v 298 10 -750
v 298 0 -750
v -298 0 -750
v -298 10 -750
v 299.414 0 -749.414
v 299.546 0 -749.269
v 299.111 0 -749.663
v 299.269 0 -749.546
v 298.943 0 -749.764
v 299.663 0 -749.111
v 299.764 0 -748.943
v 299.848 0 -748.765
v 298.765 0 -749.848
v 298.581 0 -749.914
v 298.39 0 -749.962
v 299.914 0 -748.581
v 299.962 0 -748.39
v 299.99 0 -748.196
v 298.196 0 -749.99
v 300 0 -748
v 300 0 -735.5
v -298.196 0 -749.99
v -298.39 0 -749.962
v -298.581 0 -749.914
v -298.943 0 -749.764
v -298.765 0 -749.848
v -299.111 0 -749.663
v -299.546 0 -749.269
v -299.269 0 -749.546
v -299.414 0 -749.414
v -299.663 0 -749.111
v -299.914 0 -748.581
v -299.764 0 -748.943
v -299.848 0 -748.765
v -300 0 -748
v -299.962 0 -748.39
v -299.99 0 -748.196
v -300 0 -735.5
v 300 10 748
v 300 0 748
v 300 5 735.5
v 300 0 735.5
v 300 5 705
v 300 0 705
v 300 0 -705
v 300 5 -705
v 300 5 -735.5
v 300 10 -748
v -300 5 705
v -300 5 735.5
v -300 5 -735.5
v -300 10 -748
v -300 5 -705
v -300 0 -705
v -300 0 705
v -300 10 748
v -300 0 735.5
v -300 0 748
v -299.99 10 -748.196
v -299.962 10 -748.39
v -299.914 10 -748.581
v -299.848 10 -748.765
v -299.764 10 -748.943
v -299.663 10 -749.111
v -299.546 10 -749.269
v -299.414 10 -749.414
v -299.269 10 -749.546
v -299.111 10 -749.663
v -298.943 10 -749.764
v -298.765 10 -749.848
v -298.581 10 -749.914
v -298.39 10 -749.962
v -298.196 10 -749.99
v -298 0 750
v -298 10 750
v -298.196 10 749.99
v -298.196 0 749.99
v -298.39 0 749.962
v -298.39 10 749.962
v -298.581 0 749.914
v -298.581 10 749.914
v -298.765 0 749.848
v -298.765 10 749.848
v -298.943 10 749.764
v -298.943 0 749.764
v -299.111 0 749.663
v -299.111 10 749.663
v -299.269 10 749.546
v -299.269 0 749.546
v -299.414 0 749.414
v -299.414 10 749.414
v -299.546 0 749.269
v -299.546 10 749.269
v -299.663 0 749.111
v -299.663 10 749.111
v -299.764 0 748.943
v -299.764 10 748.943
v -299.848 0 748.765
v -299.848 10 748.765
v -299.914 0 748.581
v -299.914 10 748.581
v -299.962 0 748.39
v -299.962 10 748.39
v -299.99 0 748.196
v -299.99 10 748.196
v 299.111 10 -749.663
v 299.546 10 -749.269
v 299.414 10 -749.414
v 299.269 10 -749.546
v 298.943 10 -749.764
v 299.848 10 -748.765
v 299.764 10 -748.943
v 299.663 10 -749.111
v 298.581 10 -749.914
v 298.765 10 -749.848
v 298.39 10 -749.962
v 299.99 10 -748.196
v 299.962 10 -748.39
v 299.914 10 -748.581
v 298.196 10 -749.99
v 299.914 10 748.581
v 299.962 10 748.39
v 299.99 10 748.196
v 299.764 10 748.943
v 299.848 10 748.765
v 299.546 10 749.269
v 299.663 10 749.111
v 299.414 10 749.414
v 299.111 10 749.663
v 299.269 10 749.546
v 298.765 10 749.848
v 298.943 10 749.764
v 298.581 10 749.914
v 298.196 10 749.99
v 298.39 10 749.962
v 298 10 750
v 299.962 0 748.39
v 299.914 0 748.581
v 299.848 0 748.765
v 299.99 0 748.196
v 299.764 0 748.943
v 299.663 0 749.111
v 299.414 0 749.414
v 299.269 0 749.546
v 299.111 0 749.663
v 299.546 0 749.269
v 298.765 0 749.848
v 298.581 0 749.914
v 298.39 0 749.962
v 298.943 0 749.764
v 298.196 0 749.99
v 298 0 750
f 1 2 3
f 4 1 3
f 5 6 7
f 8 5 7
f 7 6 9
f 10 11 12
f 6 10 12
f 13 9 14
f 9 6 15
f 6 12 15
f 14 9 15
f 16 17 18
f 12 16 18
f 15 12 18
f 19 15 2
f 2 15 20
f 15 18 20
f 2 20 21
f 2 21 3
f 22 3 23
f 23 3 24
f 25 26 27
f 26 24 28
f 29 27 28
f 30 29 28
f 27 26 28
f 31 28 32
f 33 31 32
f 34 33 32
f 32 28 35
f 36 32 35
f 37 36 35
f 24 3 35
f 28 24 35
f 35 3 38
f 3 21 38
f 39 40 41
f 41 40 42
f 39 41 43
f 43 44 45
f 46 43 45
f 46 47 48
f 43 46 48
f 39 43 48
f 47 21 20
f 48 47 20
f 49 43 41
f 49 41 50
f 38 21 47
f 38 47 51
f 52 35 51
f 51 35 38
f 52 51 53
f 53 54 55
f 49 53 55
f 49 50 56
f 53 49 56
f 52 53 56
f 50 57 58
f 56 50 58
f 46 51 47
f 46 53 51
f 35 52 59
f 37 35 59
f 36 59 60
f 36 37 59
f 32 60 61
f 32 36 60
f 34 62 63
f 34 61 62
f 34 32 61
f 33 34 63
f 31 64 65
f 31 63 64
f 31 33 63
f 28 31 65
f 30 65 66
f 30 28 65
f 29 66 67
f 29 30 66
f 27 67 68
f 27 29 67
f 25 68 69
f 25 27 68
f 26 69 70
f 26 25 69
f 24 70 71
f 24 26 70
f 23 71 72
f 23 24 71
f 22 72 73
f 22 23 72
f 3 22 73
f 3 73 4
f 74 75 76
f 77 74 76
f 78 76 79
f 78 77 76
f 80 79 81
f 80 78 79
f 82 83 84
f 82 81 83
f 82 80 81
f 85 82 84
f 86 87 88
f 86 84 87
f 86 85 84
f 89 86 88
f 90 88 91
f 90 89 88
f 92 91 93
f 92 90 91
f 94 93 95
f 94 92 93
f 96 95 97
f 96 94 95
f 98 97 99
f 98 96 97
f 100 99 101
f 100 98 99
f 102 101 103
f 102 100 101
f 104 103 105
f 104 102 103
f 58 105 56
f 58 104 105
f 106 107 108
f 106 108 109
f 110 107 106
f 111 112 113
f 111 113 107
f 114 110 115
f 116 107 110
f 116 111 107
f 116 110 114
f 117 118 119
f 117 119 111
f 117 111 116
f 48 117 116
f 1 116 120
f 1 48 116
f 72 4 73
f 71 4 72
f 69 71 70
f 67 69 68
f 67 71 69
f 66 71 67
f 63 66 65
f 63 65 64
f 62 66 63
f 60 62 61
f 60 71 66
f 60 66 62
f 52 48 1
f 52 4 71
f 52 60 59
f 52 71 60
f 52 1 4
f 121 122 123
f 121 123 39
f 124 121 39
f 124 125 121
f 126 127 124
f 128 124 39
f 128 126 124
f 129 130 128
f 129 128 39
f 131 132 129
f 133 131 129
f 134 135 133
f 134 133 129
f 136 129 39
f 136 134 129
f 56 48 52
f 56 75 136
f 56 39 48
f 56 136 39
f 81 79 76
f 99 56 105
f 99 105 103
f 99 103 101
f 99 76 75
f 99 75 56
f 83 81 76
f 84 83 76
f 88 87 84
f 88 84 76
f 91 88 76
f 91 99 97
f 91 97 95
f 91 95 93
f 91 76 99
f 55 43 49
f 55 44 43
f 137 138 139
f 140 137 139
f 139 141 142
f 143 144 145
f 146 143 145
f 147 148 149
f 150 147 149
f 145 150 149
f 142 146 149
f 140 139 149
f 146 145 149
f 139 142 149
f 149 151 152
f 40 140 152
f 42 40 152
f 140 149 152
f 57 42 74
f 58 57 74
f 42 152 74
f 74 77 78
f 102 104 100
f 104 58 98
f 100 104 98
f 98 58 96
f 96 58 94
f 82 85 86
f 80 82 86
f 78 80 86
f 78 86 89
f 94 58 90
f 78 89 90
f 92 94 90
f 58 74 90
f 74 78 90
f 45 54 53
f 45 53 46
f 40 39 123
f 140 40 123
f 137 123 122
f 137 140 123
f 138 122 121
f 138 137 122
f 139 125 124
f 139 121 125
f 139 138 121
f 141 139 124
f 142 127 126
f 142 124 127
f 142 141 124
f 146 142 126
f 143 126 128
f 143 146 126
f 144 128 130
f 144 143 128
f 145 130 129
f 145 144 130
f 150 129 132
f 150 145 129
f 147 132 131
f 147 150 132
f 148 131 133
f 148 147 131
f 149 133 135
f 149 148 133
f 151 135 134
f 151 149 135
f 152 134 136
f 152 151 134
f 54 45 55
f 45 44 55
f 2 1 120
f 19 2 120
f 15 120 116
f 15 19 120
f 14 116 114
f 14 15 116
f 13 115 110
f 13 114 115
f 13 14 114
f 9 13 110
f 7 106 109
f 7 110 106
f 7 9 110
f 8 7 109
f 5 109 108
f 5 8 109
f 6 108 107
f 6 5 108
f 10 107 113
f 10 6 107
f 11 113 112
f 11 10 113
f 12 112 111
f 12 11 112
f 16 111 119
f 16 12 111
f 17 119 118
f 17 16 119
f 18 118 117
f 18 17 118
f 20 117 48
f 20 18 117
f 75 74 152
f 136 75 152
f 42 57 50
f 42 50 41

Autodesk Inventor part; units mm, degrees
ref_plane "YZ Plane" through (0, 0, 0) normal (1, 0, 0) x (0, 1, 0)
ref_plane "XZ Plane" through (0, 0, 0) normal (0, 1, 0) x (-1, 0, 0)
ref_plane "XY Plane" through (0, 0, 0) normal (0, 0, 1) x (1, 0, 0)
sketch "Esboço1" plane through (0, 0, 0) normal (0, 1, 0) x (-1, 0, 0)
  line L0 (-298, -750) -> (298, -750)
  line L1 (300, -748) -> (300, 748)
  line L2 (298, 750) -> (-298, 750)
  line L3 (-300, 748) -> (-300, -748)
  line L4 (-300, -750) -> (300, 750) construction
  line L5 (300, -750) -> (-300, 750) construction
  arc A0 (300, 748) -> (298, 750) centre (298, 748) ccw
  arc A1 (-298, 750) -> (-300, 748) centre (-298, 748) ccw
  arc A2 (298, -750) -> (300, -748) centre (298, -748) ccw
  arc A3 (-300, -748) -> (-298, -750) centre (-298, -748) ccw
  point P0 (0, 0)
  dimension "d0" = 600
  dimension "d1" = 1500
  dimension "d2" = 2
extrude "Extrusão1" add sketch "Esboço1" along normal blind 10
sketch "Esboço3" plane through (0, 0, 0) normal (0, -1, 0) x (1, 0, 0)
  line L0 (300, -735.5) -> (-300, -735.5)
  line L1 (-300, -735.5) -> (-300, -705)
  line L2 (-300, -705) -> (300, -705)
  line L3 (300, -705) -> (300, -735.5)
  line L4 (300, -735.5) -> (-300, -705) construction
  line L5 (-300, -735.5) -> (300, -705) construction
  line L6 (-420, 0) -> (420, 0) projected
  line L7 (298, -750) -> (-298, -750) projected
  line L8 (-300, 675) -> (-300, 705)
  point P0 (0, 0)
  point P1 (0, -720.25)
  point P2 (300, -720.25)
  point P3 (-300, -720.25)
  dimension "d13" = 30.5
  dimension "d14" = 600
  dimension "d15" = 705
  dimension "d16" = 14.5
extrude "Extrusão3" cut sketch "Esboço3" against normal blind 5
mirror "Espelhar1" about plane through (0, 0, 0) normal (0, 0, 1) of "Extrusão3"
equation "\"Raio_vergadura\" = Espessura"
equation "\"Largura_alívio_de_vergadura\" = Espessura"
equation "\"Profundidade_alívio_de_vergadura\" = 0.5 * Espessura"
equation "\"Tamanho_alívio_de_dobra\" = 4 * Espessura"
equation "\"Remanescente_mínimo\" = 2 * Espessura"
equation "\"Raiodetransição\" = Raio_vergadura"
equation "\"Tamanho_de_raio_de_Jacobi\" = Raio_vergadura"
equation "\"TamanhoFolga\" = Espessura"
equation "\"Espessura\" = 0.5"
properties part number "Superfície"
